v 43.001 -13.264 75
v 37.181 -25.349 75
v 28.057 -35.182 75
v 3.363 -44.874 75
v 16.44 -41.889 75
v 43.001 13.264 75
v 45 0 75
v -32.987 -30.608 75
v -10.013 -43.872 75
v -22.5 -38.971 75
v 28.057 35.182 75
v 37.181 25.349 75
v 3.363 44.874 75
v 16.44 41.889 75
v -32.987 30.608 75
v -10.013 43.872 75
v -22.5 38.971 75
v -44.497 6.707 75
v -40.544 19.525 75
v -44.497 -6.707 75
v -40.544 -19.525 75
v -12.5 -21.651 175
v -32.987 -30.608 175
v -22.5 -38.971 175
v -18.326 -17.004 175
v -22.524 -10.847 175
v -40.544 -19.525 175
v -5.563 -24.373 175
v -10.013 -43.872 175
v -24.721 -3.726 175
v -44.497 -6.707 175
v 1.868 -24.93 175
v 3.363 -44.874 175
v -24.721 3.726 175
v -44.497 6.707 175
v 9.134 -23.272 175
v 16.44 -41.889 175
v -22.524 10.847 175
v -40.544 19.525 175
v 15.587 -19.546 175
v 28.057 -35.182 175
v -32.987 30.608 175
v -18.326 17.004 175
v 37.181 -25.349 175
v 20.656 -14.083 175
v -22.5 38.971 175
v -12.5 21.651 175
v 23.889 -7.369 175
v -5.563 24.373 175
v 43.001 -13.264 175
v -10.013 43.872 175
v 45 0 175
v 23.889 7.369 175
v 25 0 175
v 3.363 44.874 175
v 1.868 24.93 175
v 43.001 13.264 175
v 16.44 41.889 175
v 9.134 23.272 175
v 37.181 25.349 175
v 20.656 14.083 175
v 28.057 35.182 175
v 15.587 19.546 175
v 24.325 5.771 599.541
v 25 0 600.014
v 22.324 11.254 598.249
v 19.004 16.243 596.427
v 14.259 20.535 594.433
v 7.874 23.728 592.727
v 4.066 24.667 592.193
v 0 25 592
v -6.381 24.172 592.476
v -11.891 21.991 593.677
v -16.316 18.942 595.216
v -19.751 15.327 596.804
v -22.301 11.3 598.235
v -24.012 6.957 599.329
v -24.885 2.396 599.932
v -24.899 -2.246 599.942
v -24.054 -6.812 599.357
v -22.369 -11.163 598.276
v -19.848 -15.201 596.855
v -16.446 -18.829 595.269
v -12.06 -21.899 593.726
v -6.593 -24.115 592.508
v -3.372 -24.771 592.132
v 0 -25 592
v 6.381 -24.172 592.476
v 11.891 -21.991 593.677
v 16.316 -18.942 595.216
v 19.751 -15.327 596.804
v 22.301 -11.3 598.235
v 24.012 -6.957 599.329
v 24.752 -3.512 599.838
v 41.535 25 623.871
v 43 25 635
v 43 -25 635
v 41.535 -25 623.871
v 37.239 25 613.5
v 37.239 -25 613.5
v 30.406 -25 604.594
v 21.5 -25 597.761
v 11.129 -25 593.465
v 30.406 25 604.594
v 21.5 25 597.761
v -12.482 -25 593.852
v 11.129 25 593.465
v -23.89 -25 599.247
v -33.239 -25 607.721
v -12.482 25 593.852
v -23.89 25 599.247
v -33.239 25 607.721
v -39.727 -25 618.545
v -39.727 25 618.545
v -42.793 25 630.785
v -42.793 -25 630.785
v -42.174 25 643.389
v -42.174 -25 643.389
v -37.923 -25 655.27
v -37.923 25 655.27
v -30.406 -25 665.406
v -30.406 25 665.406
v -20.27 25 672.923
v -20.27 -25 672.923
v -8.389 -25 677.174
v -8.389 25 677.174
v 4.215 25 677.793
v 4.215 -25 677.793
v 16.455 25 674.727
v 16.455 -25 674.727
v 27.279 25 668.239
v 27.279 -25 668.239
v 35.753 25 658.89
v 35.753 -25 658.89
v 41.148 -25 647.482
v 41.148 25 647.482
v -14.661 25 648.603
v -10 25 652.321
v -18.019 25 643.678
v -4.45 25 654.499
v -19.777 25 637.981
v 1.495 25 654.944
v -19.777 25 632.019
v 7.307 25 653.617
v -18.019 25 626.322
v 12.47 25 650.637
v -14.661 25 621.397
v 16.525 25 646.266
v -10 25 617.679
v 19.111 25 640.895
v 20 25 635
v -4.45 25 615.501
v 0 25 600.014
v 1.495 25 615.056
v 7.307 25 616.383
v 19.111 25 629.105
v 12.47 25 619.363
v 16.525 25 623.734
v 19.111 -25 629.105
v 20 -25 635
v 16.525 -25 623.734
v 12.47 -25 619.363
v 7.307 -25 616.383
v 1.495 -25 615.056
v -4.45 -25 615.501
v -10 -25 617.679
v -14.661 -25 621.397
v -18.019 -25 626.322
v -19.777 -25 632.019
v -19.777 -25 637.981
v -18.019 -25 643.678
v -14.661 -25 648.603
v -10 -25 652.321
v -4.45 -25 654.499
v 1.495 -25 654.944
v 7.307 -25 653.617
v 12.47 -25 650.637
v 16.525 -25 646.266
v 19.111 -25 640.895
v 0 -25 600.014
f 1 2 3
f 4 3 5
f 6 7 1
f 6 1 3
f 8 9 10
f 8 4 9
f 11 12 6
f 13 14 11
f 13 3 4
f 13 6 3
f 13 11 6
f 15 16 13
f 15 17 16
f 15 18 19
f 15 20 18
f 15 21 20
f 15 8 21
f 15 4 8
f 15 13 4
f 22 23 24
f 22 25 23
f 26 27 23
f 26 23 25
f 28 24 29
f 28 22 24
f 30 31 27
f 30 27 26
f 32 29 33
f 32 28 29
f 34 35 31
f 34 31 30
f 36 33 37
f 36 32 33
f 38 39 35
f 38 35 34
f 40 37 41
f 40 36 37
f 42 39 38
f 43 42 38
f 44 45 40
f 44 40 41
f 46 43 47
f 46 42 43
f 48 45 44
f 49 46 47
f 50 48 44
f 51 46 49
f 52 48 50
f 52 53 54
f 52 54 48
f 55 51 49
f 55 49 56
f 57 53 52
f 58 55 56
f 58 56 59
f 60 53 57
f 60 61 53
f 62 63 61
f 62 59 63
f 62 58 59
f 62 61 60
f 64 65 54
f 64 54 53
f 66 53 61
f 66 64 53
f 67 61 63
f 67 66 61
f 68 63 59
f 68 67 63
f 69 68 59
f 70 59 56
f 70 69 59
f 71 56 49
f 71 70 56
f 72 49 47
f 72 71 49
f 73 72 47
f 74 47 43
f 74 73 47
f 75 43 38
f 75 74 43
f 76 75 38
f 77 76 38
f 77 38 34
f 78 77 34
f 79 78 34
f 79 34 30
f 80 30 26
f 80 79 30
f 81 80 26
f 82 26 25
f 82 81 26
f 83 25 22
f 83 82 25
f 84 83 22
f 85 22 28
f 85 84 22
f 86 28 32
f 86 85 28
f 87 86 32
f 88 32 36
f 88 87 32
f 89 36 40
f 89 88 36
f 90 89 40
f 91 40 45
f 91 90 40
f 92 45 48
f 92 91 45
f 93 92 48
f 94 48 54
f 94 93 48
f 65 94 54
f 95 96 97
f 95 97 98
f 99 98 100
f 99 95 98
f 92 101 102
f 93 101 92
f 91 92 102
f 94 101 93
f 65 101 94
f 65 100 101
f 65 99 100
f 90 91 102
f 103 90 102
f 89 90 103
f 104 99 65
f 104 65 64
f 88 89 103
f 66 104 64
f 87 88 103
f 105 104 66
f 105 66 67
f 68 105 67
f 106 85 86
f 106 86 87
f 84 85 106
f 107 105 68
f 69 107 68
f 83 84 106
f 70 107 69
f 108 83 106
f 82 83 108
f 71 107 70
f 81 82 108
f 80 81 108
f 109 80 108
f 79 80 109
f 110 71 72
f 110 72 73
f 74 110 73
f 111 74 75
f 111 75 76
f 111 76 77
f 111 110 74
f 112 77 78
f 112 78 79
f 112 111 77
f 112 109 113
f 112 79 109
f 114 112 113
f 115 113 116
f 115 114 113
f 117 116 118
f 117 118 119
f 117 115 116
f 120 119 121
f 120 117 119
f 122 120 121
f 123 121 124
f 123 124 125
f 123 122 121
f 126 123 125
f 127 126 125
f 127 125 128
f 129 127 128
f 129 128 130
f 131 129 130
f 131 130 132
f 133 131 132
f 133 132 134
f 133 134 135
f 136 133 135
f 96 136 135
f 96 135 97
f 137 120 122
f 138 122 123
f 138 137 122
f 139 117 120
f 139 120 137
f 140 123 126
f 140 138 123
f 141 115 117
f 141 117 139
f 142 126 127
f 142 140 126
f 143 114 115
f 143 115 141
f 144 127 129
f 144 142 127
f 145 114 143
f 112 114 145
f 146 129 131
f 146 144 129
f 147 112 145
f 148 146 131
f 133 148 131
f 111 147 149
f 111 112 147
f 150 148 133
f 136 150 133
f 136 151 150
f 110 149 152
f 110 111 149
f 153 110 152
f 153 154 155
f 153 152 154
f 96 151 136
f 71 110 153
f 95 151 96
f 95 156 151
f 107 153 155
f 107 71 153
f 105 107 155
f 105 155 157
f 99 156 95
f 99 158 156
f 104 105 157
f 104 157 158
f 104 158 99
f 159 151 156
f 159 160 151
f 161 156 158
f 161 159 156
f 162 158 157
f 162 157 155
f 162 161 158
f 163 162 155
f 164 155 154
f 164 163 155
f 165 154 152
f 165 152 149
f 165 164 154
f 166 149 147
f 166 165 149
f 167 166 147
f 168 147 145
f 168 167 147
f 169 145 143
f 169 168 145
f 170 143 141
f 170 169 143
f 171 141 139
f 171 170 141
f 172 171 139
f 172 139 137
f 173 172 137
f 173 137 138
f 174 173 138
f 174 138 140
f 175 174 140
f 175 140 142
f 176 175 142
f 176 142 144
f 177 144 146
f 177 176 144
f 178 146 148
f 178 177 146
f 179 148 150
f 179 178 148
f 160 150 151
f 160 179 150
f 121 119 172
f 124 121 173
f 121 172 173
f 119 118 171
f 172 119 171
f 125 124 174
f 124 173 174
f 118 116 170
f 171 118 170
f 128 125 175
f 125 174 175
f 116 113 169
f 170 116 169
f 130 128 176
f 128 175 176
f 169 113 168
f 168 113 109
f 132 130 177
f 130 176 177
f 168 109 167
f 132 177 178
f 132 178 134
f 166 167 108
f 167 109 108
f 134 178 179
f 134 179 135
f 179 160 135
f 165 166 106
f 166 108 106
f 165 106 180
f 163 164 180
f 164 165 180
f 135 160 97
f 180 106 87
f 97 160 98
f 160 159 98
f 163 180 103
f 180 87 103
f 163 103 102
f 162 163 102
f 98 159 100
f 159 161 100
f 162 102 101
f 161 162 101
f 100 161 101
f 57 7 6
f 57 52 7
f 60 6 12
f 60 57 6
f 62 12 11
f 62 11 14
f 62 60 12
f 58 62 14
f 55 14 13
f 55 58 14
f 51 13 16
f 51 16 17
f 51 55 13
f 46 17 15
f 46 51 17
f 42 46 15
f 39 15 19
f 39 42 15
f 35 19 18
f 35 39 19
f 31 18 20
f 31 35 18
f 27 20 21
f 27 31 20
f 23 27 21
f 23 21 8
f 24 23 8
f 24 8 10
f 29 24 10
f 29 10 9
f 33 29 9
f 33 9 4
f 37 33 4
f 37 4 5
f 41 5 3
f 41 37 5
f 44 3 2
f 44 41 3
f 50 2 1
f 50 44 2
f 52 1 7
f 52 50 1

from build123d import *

# Parameters (mm, degrees)
SKETCH3_R           = 43
SKETCH3_R_2         = 20
BOSS_EXTRUDE1_DEPTH = 25


with BuildPart() as part:
    # Sketch1 → Revolve1 (revolve)
    with BuildSketch(Plane(origin=(0, 0, 0), x_dir=(1, 0, 0), z_dir=(0, 1, 0))):
        Polygon((0, -75), (45, -75), (45, -175), (25, -175), (25, -600.014288631), (0, -600.014288631), align=None)
    revolve(axis=Axis((0, 0, 75), (0, 0, 1)))

    # Sketch3 → Boss-Extrude1 (add, symmetric)
    with BuildSketch(Plane(origin=(0, 0, 0), x_dir=(1, 0, 0), z_dir=(0, 1, 0))):
        with Locations((0, -635)):
            Circle(SKETCH3_R)
        with Locations((0, -635)):
            Circle(SKETCH3_R_2, mode=Mode.SUBTRACT)
    extrude(amount=BOSS_EXTRUDE1_DEPTH, both=True)


solid = part.part
